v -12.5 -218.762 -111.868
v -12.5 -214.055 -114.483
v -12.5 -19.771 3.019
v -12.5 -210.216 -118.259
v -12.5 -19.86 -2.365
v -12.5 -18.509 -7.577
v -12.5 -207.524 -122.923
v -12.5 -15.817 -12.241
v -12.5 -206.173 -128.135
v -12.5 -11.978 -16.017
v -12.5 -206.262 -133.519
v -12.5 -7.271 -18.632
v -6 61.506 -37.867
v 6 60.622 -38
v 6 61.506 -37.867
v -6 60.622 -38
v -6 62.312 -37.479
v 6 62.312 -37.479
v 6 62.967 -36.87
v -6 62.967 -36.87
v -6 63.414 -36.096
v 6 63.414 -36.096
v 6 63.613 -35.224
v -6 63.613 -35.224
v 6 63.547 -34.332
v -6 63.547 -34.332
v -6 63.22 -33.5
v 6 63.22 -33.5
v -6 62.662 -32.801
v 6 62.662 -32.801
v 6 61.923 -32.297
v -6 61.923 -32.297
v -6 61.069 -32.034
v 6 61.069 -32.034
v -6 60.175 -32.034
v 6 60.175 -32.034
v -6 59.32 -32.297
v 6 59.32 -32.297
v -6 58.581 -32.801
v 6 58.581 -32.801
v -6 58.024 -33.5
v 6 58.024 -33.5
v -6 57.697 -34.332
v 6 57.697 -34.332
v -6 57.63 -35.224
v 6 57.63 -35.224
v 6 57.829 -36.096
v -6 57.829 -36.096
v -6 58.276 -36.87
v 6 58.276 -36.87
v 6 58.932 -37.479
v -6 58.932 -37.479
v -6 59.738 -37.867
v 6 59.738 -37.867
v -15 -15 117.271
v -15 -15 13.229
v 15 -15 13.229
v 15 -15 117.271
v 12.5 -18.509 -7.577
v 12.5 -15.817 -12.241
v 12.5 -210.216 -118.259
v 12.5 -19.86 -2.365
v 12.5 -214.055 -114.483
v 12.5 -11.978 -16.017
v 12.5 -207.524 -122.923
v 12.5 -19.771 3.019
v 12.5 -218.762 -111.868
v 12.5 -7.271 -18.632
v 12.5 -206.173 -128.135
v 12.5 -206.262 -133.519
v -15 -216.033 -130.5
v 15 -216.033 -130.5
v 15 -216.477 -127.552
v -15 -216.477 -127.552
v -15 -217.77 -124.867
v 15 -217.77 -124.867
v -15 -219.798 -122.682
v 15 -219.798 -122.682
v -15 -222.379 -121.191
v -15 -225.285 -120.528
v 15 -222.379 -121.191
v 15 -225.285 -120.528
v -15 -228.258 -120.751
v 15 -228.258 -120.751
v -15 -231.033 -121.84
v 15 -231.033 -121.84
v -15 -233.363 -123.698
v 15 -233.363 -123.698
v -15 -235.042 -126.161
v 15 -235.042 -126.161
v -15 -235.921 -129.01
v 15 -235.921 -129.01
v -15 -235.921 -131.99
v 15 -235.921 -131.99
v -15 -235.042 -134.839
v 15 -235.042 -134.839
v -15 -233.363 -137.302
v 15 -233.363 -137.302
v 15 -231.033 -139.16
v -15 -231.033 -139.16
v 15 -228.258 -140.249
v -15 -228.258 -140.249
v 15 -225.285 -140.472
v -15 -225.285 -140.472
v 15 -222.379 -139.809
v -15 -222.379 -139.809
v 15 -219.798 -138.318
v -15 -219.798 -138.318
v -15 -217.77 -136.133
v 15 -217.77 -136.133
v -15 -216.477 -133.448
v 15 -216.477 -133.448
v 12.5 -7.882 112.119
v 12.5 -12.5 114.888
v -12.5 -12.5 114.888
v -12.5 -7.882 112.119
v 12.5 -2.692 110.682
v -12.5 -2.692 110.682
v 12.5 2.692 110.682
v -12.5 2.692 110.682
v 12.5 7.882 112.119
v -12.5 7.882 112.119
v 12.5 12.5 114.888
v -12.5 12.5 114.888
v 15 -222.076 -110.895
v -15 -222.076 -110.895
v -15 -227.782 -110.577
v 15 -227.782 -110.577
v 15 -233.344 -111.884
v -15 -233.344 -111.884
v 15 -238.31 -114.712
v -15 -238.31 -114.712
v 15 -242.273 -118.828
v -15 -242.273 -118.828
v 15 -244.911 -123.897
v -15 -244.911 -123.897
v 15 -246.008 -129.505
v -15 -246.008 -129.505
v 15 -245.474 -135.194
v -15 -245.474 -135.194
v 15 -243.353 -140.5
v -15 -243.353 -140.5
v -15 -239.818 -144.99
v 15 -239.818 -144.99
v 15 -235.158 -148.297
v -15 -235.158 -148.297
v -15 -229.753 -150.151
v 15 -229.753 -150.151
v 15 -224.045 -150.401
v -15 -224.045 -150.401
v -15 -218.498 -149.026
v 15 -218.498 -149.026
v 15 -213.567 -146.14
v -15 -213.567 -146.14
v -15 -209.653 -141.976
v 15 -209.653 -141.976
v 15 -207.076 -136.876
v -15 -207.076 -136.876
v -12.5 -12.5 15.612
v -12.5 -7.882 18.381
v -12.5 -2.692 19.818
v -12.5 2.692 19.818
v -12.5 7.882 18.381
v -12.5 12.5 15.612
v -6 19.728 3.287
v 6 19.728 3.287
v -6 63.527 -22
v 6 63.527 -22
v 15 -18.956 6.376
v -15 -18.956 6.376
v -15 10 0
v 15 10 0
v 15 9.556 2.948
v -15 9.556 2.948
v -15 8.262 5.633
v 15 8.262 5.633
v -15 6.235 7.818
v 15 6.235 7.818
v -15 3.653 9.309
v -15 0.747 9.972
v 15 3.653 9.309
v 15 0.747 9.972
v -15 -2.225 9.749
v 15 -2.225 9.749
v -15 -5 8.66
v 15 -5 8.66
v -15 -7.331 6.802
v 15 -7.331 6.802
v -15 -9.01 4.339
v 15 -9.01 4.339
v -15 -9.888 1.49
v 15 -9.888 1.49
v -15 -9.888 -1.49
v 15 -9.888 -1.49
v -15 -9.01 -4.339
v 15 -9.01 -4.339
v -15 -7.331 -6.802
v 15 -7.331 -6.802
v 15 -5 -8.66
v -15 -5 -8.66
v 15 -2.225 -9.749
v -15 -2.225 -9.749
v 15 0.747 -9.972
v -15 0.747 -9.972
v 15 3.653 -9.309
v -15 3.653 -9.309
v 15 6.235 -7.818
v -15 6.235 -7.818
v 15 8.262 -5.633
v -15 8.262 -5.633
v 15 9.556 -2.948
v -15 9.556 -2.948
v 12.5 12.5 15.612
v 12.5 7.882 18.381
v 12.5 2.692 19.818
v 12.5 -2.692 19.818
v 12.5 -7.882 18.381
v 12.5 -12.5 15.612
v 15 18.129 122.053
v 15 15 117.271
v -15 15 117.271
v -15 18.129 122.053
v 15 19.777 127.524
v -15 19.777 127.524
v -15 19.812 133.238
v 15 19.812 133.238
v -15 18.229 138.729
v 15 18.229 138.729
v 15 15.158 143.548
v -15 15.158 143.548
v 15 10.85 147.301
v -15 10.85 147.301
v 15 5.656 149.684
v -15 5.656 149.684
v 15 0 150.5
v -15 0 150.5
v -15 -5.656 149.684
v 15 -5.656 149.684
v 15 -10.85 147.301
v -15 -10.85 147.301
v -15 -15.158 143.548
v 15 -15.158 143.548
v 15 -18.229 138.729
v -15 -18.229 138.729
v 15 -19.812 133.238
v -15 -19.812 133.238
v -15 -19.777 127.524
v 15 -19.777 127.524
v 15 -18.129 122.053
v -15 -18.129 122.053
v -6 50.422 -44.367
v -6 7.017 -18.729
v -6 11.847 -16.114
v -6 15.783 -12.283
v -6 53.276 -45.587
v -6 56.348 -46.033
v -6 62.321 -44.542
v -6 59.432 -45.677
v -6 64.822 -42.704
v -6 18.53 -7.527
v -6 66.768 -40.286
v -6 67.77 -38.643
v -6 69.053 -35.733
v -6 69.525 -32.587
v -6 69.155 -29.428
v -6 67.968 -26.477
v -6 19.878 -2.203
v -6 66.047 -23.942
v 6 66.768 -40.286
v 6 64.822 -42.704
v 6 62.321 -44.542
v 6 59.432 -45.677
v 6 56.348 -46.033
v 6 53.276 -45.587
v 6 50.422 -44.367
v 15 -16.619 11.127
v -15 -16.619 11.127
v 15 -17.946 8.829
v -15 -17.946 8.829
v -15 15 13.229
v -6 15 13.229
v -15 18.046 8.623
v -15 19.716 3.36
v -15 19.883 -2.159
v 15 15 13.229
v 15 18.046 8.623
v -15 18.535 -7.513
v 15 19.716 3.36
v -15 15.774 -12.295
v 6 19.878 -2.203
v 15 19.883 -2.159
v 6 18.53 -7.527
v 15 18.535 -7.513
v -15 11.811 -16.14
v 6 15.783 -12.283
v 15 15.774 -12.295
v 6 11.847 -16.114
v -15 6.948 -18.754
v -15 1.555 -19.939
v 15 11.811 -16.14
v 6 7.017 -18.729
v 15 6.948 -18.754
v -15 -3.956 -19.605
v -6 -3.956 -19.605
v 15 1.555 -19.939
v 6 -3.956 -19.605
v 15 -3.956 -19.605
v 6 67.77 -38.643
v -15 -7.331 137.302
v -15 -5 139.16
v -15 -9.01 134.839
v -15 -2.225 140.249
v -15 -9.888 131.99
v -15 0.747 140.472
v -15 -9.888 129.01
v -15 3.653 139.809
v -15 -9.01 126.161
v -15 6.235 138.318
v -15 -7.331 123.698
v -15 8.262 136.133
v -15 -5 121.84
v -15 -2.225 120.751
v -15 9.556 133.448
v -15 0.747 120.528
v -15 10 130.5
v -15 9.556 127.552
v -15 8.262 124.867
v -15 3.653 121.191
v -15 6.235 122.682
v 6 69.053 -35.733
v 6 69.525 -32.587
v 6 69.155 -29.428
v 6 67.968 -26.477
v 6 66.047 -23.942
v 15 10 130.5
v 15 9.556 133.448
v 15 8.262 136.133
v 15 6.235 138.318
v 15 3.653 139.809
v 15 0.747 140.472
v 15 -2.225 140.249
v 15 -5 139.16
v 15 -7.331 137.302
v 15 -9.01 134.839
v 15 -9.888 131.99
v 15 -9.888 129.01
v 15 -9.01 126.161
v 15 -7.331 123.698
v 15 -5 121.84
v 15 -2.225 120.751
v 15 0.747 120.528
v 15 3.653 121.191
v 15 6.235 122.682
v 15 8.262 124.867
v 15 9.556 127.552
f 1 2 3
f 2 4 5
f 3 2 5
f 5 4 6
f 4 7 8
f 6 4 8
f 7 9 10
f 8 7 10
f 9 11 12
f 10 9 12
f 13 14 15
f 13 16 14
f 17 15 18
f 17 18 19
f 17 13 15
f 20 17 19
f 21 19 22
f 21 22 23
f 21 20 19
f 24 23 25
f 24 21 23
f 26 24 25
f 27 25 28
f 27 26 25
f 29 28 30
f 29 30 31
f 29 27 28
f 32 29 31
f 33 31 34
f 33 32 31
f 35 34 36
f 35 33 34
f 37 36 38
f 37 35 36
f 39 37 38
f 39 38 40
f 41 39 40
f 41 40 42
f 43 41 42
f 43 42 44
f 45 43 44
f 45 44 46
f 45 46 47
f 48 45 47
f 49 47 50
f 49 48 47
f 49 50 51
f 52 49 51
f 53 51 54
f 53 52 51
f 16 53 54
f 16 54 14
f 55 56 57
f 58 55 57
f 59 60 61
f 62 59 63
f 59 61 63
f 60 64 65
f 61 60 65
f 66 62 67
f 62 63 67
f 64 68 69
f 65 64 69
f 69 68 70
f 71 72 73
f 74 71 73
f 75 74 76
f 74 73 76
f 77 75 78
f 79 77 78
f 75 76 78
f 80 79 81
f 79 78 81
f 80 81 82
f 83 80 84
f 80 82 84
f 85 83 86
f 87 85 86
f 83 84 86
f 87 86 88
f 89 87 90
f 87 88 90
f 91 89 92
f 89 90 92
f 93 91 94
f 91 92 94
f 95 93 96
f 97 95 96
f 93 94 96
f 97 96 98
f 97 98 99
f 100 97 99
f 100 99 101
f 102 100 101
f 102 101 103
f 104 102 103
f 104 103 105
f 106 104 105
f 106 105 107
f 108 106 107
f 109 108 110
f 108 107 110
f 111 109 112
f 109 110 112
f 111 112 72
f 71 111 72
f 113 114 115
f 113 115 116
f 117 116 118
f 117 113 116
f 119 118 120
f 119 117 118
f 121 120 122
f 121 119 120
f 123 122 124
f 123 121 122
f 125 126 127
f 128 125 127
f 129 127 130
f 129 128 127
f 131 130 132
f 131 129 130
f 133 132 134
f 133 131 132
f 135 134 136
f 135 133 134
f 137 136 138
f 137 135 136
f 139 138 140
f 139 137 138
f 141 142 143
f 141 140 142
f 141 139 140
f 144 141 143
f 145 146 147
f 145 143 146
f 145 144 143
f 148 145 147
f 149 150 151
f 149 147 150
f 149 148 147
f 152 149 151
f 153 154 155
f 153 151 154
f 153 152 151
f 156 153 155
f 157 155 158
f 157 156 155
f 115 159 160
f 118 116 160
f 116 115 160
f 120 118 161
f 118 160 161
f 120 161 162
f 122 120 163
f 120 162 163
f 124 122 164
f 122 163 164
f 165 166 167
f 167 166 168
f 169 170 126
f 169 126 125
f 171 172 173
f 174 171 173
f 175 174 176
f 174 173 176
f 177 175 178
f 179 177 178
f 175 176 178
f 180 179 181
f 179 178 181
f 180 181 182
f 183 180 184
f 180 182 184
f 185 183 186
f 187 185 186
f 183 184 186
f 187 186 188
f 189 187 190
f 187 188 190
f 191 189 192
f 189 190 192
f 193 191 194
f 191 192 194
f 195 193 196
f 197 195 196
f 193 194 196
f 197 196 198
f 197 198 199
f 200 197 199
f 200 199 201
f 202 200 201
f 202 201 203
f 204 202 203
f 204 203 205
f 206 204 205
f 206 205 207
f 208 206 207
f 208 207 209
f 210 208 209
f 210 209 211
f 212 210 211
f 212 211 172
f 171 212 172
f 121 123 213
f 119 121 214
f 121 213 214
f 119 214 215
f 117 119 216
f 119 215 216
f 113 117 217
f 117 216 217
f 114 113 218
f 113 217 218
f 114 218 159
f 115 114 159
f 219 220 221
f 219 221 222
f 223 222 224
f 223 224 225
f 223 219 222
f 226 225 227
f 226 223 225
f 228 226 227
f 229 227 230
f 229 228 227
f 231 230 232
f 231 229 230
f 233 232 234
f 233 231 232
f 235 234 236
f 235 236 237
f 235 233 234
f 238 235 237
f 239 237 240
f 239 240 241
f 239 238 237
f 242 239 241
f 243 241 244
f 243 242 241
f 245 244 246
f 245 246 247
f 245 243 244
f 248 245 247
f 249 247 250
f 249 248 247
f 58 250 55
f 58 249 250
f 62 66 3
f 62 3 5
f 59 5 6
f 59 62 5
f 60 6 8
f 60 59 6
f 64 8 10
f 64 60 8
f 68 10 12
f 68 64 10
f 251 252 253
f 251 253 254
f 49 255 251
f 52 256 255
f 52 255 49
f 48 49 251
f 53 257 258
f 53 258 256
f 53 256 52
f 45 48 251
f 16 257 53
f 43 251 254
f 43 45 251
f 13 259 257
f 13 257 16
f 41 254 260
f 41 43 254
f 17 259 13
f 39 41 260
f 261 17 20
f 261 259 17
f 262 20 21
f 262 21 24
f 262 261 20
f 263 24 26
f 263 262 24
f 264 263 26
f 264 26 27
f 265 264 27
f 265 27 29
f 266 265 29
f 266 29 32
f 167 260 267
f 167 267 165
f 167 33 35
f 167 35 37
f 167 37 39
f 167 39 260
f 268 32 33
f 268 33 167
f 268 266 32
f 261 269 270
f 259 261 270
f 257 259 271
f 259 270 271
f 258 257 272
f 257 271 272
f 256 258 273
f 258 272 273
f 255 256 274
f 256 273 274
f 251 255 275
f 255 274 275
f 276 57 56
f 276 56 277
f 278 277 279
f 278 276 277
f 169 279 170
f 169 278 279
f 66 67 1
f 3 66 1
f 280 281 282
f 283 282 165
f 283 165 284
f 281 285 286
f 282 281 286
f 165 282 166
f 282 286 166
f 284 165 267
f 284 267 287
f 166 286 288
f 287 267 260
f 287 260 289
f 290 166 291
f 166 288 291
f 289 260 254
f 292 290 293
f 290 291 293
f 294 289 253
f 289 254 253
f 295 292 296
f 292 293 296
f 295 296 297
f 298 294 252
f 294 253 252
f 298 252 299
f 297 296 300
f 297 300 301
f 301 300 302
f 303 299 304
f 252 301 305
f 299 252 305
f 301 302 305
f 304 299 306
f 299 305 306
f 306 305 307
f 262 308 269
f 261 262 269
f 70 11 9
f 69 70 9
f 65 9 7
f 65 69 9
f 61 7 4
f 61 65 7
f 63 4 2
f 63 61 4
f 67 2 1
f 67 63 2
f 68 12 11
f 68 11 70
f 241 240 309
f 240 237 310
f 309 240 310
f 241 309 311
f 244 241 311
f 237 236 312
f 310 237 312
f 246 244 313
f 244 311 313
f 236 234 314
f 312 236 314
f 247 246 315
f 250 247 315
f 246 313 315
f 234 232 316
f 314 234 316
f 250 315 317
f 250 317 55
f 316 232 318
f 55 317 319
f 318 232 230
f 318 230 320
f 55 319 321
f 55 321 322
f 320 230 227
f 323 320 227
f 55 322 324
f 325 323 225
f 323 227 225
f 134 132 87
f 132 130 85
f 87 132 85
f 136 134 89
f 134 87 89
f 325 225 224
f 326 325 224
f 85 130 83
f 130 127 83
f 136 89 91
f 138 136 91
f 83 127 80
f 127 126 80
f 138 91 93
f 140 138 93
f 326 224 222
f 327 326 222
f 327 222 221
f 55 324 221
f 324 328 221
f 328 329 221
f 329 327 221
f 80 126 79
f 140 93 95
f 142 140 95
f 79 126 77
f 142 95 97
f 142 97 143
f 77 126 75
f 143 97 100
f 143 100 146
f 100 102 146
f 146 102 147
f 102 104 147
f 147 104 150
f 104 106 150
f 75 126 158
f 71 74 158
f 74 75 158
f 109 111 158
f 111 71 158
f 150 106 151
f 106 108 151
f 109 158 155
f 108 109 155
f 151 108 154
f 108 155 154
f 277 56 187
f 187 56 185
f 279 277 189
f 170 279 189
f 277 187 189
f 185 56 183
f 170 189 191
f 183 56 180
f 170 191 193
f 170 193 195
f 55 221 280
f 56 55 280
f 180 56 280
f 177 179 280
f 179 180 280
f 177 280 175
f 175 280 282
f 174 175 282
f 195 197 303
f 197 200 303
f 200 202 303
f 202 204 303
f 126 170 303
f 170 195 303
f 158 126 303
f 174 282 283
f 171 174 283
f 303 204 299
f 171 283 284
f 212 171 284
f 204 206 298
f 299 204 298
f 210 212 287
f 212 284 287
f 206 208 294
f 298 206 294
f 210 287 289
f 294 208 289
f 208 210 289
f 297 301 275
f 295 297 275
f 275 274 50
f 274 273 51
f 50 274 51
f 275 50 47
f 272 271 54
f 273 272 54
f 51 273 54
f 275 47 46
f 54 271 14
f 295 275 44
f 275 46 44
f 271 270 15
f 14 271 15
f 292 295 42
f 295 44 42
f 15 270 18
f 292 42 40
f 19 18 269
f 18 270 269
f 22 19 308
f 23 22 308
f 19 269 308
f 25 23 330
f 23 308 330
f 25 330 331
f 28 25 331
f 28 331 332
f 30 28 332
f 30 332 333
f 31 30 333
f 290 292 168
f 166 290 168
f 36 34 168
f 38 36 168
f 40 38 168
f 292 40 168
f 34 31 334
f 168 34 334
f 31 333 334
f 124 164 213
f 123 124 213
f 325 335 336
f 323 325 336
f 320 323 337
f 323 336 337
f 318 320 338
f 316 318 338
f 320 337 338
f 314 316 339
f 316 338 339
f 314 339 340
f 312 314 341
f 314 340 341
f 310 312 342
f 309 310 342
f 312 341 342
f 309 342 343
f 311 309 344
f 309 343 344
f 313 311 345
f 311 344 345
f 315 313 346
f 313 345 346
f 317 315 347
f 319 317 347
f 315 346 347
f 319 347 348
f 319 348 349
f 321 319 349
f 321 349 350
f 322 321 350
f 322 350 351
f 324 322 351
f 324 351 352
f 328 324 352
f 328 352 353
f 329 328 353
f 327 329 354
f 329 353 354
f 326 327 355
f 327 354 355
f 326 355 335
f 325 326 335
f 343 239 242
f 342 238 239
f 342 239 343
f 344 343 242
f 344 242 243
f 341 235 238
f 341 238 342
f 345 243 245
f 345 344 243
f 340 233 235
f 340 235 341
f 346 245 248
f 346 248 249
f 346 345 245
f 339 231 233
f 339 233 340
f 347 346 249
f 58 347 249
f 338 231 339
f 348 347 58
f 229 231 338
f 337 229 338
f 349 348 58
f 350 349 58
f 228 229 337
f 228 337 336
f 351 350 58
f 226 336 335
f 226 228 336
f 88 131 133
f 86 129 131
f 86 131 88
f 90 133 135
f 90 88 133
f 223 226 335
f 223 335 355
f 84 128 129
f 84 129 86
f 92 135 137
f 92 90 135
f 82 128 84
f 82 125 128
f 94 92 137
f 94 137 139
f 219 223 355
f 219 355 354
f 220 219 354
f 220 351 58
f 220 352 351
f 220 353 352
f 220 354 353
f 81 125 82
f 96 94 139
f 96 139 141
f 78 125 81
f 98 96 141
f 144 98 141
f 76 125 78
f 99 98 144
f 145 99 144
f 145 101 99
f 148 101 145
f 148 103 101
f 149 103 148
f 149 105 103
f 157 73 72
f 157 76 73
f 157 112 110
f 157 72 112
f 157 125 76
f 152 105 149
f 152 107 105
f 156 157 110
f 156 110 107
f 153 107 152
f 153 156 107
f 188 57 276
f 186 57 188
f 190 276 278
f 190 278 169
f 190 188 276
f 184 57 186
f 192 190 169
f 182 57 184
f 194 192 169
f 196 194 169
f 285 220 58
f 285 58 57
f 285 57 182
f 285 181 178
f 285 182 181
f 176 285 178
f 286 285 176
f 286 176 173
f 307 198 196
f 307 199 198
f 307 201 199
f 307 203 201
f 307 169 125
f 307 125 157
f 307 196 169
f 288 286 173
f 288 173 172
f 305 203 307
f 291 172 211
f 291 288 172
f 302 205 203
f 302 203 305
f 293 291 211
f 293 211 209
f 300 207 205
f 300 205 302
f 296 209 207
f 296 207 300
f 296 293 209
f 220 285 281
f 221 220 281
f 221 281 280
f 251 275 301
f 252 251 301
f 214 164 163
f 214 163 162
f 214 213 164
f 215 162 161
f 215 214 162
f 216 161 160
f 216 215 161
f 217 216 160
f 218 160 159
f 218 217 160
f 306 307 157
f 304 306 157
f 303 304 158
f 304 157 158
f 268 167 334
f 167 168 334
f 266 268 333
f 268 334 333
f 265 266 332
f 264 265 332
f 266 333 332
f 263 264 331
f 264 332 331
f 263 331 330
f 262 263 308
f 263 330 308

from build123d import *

# Parameters (mm, degrees)
SKETCH7_W           = 30
SKETCH7_H           = 30
SKETCH7_W_2         = 25
SKETCH7_H_2         = 25
SKETCH8_R           = 20
BOSS_EXTRUDE1_DEPTH = 30
SKETCH9_R           = 10
CUT_EXTRUDE1_DEPTH  = 30
SKETCH13_R          = 3
BOSS_EXTRUDE2_DEPTH = 6


with BuildPart() as part:
    # Sweep4: sweep along a path in Sketch2
    with BuildLine(Plane(origin=(0, 0, 0), x_dir=(0, 0, -1), z_dir=(1, 0, 0))) as sweep4_path:
        Line((-130.5, 0), (0, 0))
        Line((0, 0), (130.5, -226.032630388))
    # Sketch7 → Sweep4 (sweep)
    with BuildSketch(Plane.XY.offset(130.5)):
        Rectangle(SKETCH7_W, SKETCH7_H)
        Rectangle(SKETCH7_W_2, SKETCH7_H_2, mode=Mode.SUBTRACT)
    sweep(path=sweep4_path.line, transition=Transition.RIGHT)

    # Sketch8 → Boss-Extrude1 (add)
    with BuildSketch(Plane(origin=(15, 0, 0), x_dir=(0, 0, -1), z_dir=(1, 0, 0))):
        Circle(SKETCH8_R)
        with Locations((-130.5, 0)):
            Circle(SKETCH8_R)
        with Locations((130.5, -226.032630388)):
            Circle(SKETCH8_R)
    extrude(amount=-BOSS_EXTRUDE1_DEPTH)

    # Sketch9 → Cut-Extrude1 (cut)
    with BuildSketch(Plane(origin=(15, 0, 0), x_dir=(0, 0, -1), z_dir=(1, 0, 0))):
        with Locations(Location((0, 0, 0), (0, 0, 90))):
            Circle(SKETCH9_R)
        with Locations(Location((-130.5, 0, 0), (0, 0, 90))):
            Circle(SKETCH9_R)
        with Locations(Location((130.5, -226.032630388, 0), (0, 0, 90))):
            Circle(SKETCH9_R)
    extrude(amount=-CUT_EXTRUDE1_DEPTH, mode=Mode.SUBTRACT)

    # Sketch13 → Boss-Extrude2 (add, symmetric)
    with BuildSketch(Plane(origin=(0, 0, 0), x_dir=(0, 0, -1), z_dir=(1, 0, 0))):
        with BuildLine():
            Line((19.604759334, -3.956439237), (9.859578521, 1.669943529))
            ThreePointArc((9.859578521, 1.669943529), (5, 8.660254038), (-3.483575742, 9.373617234))
            Line((-3.483575742, 9.373617234), (-13.228756555, 15))
            ThreePointArc((-13.228756555, 15), (-8.58962126, 18.061517284), (-3.287056594, 19.728032313))
            Line((-3.287056594, 19.728032313), (22.000269373, 63.526965676))
            ThreePointArc((22.000269373, 63.526965676), (29.427887497, 69.154976368), (38.643459087, 67.770326373))
            Line((38.643459087, 67.770326373), (40.285678743, 66.768182028))
            ThreePointArc((40.285678743, 66.768182028), (45.677401844, 59.431654602), (44.366919196, 50.421774031))
            Line((44.366919196, 50.421774031), (18.728505447, 7.017341642))
            ThreePointArc((18.728505447, 7.017341642), (19.936543429, 1.591928422), (19.604759334, -3.956439237))
        make_face()
        with Locations((35, 60.621778265)):
            Circle(SKETCH13_R, mode=Mode.SUBTRACT)
    extrude(amount=BOSS_EXTRUDE2_DEPTH, both=True)


solid = part.part
